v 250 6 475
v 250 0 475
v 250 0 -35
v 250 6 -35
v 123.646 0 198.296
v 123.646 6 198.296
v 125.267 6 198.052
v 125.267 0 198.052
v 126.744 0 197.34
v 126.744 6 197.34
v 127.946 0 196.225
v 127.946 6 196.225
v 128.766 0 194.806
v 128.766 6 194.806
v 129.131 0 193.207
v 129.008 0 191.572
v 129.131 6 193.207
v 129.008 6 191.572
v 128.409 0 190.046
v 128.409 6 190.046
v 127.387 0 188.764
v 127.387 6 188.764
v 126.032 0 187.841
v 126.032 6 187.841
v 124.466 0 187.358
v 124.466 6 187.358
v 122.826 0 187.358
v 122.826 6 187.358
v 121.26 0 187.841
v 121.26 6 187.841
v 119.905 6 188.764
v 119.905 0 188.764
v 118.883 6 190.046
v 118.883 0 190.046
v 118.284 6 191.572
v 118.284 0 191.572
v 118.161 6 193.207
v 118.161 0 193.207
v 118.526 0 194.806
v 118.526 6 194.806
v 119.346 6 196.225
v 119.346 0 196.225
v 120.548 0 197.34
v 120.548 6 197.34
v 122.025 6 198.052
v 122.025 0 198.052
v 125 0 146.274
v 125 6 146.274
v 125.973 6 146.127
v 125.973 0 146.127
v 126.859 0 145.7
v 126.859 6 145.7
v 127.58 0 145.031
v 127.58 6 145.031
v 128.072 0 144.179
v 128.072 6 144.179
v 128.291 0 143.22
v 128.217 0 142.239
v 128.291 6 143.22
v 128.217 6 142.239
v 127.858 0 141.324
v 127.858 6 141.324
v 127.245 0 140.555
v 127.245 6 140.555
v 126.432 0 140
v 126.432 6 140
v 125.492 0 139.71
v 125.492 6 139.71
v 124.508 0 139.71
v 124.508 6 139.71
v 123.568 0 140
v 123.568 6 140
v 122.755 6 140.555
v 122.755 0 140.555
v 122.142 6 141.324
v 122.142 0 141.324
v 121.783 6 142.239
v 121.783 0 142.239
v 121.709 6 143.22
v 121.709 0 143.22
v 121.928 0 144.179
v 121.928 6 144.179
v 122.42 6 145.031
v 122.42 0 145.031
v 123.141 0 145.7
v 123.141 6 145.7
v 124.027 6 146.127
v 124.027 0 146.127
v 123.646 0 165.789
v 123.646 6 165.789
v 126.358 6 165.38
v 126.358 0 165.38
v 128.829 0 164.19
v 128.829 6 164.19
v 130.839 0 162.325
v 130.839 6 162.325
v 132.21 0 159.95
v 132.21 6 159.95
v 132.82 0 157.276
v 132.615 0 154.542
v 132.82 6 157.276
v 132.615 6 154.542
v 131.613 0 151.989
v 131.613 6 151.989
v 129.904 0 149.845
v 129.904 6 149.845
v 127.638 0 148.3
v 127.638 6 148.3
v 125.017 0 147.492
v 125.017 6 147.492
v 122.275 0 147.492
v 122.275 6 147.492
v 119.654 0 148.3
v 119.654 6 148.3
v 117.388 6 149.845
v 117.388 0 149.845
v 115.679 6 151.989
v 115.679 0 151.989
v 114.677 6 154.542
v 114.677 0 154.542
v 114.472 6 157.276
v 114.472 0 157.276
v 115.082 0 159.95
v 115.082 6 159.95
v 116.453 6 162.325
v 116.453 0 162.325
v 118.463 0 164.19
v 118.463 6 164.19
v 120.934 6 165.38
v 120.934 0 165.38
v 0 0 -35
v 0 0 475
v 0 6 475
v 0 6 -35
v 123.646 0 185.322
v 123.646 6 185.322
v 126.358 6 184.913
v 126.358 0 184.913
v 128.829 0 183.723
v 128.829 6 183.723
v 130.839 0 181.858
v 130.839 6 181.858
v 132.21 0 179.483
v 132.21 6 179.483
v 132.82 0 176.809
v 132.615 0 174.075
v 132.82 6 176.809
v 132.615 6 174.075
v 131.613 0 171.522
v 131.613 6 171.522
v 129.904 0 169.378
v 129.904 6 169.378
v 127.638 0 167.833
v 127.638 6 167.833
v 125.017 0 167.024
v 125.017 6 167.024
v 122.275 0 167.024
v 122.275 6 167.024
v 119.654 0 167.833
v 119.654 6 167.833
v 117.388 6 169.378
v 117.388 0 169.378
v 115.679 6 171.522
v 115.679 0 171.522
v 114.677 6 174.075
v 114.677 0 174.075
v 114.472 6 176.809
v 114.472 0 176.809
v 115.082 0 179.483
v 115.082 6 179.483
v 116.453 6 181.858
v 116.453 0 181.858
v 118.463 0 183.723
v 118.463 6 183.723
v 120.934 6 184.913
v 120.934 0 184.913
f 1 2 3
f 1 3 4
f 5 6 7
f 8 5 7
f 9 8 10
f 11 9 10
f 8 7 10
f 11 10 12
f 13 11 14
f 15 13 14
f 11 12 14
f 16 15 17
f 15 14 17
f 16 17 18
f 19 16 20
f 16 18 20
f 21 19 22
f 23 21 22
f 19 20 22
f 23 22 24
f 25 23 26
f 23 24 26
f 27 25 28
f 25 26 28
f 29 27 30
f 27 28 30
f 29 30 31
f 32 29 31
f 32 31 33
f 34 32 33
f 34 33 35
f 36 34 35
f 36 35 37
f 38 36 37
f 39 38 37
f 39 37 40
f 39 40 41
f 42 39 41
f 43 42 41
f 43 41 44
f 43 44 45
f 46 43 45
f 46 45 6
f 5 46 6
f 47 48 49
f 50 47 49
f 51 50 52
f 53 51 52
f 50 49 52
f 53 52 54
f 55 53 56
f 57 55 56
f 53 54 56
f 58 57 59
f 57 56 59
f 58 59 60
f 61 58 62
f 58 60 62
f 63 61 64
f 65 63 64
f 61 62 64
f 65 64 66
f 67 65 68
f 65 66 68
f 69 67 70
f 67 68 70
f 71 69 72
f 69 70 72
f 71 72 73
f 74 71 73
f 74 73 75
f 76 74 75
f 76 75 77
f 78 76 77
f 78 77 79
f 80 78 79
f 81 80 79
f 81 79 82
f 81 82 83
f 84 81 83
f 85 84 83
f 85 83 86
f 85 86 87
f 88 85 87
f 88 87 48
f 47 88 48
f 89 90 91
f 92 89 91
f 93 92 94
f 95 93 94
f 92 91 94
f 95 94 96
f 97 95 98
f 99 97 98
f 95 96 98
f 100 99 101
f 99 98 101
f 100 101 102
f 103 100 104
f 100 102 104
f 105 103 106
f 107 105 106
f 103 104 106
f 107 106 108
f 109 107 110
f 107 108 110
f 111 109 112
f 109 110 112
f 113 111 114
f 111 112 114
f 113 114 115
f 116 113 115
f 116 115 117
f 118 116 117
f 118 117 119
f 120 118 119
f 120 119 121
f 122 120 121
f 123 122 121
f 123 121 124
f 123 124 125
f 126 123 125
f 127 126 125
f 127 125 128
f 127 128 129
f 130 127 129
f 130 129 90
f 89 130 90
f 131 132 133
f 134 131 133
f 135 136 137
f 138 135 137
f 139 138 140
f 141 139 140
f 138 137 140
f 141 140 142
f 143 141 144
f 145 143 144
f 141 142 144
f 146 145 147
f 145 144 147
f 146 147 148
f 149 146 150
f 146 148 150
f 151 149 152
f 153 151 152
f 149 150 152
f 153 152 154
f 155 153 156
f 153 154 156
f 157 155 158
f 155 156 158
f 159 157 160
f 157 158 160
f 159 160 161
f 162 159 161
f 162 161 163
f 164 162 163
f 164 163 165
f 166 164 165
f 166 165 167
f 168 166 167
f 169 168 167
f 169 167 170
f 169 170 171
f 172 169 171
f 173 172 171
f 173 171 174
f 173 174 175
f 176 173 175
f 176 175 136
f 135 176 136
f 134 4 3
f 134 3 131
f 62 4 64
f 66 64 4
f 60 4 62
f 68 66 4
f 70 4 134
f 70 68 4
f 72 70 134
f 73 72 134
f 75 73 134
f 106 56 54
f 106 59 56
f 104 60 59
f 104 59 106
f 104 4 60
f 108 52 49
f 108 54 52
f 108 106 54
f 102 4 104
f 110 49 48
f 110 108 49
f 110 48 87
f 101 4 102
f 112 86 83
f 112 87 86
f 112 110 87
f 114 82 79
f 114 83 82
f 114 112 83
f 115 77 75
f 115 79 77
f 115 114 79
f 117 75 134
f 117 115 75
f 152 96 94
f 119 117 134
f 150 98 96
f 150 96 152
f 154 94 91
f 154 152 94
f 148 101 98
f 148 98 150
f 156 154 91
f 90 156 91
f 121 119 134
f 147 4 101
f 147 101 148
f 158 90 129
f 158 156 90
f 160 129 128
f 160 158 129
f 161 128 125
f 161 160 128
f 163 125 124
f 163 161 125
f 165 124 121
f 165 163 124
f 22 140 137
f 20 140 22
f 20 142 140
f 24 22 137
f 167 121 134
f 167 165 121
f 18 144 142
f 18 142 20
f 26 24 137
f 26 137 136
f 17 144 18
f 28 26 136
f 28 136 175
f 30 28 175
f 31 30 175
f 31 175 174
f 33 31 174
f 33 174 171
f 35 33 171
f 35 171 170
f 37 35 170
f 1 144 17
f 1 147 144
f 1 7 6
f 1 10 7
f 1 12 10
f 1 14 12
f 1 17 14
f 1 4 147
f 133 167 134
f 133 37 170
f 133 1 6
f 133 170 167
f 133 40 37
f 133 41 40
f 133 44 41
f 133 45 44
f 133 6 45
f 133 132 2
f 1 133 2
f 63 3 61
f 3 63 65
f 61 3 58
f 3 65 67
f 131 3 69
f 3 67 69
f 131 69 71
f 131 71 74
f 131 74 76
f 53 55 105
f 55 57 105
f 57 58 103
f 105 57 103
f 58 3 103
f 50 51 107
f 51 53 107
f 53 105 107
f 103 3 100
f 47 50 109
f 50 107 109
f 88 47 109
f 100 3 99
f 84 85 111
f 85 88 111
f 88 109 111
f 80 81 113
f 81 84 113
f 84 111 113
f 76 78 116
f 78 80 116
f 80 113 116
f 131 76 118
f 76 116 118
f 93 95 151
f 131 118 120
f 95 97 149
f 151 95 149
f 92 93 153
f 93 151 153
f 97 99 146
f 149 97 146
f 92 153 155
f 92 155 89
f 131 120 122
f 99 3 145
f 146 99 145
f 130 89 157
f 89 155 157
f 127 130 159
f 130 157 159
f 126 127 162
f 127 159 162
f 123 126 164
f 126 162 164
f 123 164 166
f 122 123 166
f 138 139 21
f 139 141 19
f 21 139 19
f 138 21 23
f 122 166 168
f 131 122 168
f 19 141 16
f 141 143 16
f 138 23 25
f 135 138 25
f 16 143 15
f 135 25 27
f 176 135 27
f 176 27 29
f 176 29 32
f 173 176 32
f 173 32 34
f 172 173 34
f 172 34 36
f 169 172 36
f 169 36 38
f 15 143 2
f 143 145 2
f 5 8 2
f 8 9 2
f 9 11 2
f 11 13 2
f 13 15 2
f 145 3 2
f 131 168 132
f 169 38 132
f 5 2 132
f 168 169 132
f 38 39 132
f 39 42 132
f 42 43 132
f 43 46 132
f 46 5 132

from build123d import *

# Parameters (mm, degrees)
ESBO_O1_W                = 250
ESBO_O1_H                = 475
RESSALTO_EXTRUS_O1_DEPTH = 6
ESBO_O2_W                = 250
ESBO_O2_H                = 6
RESSALTO_EXTRUS_O2_DEPTH = 25
ESBO_O3_W                = 250
ESBO_O3_H                = 6
RESSALTO_EXTRUS_O4_DEPTH = 80
ESBO_O4_W                = 250
ESBO_O4_H                = 6
CORTE_EXTRUS_O1_DEPTH    = 70
ESBO_O5_R                = 3.3
ESBO_O5_R_2              = 9.2
ESBO_O5_R_3              = 5.5
CORTE_EXTRUS_O3_DEPTH    = 537.806296535


with BuildPart() as part:
    # Esboço1 → Ressalto-extrusão1 (new body)
    with BuildSketch(Plane(origin=(0, 0, 0), x_dir=(1, 0, 0), z_dir=(0, 1, 0))):
        with Locations((125, -237.5)):
            Rectangle(ESBO_O1_W, ESBO_O1_H)
    extrude(amount=RESSALTO_EXTRUS_O1_DEPTH)

    # Esboço2 → Ressalto-extrusão2 (add)
    with BuildSketch(Plane(origin=(0, 0, 0), x_dir=(-1, 0, 0), z_dir=(0, 0, -1))):
        with Locations((-125, 3)):
            Rectangle(ESBO_O2_W, ESBO_O2_H)
    extrude(amount=RESSALTO_EXTRUS_O2_DEPTH)

    # Esboço3 → Ressalto-extrusão4 (add)
    with BuildSketch(Plane(origin=(0, 0, -25), x_dir=(-1, 0, 0), z_dir=(0, 0, -1))):
        with Locations((-125, 3)):
            Rectangle(ESBO_O3_W, ESBO_O3_H)
    extrude(amount=RESSALTO_EXTRUS_O4_DEPTH)

    # Esboço4 → Corte-extrusão1 (cut)
    with BuildSketch(Plane(origin=(0, 0, -105), x_dir=(-1, 0, 0), z_dir=(0, 0, -1))):
        with Locations((-125, 3)):
            Rectangle(ESBO_O4_W, ESBO_O4_H)
    extrude(amount=-CORTE_EXTRUS_O1_DEPTH, mode=Mode.SUBTRACT)

    # Esboço5 → Corte-extrusão3 (cut, through all)
    with BuildSketch(Plane(origin=(0, 6, 0), x_dir=(1, 0, 0), z_dir=(0, 1, 0))):
        with Locations(Location((125, -142.97362902, 0), (0, 0, 270))):
            Circle(ESBO_O5_R)
        with Locations(Location((123.645994784, -156.588756812, 0), (0, 0, 270))):
            Circle(ESBO_O5_R_2)
        with Locations(Location((123.645994784, -192.796164786, 0), (0, 0, 270))):
            Circle(ESBO_O5_R_3)
        with Locations(Location((123.645994784, -176.121700588, 0), (0, 0, 270))):
            Circle(ESBO_O5_R_2)
    extrude(amount=-CORTE_EXTRUS_O3_DEPTH, mode=Mode.SUBTRACT)


solid = part.part
